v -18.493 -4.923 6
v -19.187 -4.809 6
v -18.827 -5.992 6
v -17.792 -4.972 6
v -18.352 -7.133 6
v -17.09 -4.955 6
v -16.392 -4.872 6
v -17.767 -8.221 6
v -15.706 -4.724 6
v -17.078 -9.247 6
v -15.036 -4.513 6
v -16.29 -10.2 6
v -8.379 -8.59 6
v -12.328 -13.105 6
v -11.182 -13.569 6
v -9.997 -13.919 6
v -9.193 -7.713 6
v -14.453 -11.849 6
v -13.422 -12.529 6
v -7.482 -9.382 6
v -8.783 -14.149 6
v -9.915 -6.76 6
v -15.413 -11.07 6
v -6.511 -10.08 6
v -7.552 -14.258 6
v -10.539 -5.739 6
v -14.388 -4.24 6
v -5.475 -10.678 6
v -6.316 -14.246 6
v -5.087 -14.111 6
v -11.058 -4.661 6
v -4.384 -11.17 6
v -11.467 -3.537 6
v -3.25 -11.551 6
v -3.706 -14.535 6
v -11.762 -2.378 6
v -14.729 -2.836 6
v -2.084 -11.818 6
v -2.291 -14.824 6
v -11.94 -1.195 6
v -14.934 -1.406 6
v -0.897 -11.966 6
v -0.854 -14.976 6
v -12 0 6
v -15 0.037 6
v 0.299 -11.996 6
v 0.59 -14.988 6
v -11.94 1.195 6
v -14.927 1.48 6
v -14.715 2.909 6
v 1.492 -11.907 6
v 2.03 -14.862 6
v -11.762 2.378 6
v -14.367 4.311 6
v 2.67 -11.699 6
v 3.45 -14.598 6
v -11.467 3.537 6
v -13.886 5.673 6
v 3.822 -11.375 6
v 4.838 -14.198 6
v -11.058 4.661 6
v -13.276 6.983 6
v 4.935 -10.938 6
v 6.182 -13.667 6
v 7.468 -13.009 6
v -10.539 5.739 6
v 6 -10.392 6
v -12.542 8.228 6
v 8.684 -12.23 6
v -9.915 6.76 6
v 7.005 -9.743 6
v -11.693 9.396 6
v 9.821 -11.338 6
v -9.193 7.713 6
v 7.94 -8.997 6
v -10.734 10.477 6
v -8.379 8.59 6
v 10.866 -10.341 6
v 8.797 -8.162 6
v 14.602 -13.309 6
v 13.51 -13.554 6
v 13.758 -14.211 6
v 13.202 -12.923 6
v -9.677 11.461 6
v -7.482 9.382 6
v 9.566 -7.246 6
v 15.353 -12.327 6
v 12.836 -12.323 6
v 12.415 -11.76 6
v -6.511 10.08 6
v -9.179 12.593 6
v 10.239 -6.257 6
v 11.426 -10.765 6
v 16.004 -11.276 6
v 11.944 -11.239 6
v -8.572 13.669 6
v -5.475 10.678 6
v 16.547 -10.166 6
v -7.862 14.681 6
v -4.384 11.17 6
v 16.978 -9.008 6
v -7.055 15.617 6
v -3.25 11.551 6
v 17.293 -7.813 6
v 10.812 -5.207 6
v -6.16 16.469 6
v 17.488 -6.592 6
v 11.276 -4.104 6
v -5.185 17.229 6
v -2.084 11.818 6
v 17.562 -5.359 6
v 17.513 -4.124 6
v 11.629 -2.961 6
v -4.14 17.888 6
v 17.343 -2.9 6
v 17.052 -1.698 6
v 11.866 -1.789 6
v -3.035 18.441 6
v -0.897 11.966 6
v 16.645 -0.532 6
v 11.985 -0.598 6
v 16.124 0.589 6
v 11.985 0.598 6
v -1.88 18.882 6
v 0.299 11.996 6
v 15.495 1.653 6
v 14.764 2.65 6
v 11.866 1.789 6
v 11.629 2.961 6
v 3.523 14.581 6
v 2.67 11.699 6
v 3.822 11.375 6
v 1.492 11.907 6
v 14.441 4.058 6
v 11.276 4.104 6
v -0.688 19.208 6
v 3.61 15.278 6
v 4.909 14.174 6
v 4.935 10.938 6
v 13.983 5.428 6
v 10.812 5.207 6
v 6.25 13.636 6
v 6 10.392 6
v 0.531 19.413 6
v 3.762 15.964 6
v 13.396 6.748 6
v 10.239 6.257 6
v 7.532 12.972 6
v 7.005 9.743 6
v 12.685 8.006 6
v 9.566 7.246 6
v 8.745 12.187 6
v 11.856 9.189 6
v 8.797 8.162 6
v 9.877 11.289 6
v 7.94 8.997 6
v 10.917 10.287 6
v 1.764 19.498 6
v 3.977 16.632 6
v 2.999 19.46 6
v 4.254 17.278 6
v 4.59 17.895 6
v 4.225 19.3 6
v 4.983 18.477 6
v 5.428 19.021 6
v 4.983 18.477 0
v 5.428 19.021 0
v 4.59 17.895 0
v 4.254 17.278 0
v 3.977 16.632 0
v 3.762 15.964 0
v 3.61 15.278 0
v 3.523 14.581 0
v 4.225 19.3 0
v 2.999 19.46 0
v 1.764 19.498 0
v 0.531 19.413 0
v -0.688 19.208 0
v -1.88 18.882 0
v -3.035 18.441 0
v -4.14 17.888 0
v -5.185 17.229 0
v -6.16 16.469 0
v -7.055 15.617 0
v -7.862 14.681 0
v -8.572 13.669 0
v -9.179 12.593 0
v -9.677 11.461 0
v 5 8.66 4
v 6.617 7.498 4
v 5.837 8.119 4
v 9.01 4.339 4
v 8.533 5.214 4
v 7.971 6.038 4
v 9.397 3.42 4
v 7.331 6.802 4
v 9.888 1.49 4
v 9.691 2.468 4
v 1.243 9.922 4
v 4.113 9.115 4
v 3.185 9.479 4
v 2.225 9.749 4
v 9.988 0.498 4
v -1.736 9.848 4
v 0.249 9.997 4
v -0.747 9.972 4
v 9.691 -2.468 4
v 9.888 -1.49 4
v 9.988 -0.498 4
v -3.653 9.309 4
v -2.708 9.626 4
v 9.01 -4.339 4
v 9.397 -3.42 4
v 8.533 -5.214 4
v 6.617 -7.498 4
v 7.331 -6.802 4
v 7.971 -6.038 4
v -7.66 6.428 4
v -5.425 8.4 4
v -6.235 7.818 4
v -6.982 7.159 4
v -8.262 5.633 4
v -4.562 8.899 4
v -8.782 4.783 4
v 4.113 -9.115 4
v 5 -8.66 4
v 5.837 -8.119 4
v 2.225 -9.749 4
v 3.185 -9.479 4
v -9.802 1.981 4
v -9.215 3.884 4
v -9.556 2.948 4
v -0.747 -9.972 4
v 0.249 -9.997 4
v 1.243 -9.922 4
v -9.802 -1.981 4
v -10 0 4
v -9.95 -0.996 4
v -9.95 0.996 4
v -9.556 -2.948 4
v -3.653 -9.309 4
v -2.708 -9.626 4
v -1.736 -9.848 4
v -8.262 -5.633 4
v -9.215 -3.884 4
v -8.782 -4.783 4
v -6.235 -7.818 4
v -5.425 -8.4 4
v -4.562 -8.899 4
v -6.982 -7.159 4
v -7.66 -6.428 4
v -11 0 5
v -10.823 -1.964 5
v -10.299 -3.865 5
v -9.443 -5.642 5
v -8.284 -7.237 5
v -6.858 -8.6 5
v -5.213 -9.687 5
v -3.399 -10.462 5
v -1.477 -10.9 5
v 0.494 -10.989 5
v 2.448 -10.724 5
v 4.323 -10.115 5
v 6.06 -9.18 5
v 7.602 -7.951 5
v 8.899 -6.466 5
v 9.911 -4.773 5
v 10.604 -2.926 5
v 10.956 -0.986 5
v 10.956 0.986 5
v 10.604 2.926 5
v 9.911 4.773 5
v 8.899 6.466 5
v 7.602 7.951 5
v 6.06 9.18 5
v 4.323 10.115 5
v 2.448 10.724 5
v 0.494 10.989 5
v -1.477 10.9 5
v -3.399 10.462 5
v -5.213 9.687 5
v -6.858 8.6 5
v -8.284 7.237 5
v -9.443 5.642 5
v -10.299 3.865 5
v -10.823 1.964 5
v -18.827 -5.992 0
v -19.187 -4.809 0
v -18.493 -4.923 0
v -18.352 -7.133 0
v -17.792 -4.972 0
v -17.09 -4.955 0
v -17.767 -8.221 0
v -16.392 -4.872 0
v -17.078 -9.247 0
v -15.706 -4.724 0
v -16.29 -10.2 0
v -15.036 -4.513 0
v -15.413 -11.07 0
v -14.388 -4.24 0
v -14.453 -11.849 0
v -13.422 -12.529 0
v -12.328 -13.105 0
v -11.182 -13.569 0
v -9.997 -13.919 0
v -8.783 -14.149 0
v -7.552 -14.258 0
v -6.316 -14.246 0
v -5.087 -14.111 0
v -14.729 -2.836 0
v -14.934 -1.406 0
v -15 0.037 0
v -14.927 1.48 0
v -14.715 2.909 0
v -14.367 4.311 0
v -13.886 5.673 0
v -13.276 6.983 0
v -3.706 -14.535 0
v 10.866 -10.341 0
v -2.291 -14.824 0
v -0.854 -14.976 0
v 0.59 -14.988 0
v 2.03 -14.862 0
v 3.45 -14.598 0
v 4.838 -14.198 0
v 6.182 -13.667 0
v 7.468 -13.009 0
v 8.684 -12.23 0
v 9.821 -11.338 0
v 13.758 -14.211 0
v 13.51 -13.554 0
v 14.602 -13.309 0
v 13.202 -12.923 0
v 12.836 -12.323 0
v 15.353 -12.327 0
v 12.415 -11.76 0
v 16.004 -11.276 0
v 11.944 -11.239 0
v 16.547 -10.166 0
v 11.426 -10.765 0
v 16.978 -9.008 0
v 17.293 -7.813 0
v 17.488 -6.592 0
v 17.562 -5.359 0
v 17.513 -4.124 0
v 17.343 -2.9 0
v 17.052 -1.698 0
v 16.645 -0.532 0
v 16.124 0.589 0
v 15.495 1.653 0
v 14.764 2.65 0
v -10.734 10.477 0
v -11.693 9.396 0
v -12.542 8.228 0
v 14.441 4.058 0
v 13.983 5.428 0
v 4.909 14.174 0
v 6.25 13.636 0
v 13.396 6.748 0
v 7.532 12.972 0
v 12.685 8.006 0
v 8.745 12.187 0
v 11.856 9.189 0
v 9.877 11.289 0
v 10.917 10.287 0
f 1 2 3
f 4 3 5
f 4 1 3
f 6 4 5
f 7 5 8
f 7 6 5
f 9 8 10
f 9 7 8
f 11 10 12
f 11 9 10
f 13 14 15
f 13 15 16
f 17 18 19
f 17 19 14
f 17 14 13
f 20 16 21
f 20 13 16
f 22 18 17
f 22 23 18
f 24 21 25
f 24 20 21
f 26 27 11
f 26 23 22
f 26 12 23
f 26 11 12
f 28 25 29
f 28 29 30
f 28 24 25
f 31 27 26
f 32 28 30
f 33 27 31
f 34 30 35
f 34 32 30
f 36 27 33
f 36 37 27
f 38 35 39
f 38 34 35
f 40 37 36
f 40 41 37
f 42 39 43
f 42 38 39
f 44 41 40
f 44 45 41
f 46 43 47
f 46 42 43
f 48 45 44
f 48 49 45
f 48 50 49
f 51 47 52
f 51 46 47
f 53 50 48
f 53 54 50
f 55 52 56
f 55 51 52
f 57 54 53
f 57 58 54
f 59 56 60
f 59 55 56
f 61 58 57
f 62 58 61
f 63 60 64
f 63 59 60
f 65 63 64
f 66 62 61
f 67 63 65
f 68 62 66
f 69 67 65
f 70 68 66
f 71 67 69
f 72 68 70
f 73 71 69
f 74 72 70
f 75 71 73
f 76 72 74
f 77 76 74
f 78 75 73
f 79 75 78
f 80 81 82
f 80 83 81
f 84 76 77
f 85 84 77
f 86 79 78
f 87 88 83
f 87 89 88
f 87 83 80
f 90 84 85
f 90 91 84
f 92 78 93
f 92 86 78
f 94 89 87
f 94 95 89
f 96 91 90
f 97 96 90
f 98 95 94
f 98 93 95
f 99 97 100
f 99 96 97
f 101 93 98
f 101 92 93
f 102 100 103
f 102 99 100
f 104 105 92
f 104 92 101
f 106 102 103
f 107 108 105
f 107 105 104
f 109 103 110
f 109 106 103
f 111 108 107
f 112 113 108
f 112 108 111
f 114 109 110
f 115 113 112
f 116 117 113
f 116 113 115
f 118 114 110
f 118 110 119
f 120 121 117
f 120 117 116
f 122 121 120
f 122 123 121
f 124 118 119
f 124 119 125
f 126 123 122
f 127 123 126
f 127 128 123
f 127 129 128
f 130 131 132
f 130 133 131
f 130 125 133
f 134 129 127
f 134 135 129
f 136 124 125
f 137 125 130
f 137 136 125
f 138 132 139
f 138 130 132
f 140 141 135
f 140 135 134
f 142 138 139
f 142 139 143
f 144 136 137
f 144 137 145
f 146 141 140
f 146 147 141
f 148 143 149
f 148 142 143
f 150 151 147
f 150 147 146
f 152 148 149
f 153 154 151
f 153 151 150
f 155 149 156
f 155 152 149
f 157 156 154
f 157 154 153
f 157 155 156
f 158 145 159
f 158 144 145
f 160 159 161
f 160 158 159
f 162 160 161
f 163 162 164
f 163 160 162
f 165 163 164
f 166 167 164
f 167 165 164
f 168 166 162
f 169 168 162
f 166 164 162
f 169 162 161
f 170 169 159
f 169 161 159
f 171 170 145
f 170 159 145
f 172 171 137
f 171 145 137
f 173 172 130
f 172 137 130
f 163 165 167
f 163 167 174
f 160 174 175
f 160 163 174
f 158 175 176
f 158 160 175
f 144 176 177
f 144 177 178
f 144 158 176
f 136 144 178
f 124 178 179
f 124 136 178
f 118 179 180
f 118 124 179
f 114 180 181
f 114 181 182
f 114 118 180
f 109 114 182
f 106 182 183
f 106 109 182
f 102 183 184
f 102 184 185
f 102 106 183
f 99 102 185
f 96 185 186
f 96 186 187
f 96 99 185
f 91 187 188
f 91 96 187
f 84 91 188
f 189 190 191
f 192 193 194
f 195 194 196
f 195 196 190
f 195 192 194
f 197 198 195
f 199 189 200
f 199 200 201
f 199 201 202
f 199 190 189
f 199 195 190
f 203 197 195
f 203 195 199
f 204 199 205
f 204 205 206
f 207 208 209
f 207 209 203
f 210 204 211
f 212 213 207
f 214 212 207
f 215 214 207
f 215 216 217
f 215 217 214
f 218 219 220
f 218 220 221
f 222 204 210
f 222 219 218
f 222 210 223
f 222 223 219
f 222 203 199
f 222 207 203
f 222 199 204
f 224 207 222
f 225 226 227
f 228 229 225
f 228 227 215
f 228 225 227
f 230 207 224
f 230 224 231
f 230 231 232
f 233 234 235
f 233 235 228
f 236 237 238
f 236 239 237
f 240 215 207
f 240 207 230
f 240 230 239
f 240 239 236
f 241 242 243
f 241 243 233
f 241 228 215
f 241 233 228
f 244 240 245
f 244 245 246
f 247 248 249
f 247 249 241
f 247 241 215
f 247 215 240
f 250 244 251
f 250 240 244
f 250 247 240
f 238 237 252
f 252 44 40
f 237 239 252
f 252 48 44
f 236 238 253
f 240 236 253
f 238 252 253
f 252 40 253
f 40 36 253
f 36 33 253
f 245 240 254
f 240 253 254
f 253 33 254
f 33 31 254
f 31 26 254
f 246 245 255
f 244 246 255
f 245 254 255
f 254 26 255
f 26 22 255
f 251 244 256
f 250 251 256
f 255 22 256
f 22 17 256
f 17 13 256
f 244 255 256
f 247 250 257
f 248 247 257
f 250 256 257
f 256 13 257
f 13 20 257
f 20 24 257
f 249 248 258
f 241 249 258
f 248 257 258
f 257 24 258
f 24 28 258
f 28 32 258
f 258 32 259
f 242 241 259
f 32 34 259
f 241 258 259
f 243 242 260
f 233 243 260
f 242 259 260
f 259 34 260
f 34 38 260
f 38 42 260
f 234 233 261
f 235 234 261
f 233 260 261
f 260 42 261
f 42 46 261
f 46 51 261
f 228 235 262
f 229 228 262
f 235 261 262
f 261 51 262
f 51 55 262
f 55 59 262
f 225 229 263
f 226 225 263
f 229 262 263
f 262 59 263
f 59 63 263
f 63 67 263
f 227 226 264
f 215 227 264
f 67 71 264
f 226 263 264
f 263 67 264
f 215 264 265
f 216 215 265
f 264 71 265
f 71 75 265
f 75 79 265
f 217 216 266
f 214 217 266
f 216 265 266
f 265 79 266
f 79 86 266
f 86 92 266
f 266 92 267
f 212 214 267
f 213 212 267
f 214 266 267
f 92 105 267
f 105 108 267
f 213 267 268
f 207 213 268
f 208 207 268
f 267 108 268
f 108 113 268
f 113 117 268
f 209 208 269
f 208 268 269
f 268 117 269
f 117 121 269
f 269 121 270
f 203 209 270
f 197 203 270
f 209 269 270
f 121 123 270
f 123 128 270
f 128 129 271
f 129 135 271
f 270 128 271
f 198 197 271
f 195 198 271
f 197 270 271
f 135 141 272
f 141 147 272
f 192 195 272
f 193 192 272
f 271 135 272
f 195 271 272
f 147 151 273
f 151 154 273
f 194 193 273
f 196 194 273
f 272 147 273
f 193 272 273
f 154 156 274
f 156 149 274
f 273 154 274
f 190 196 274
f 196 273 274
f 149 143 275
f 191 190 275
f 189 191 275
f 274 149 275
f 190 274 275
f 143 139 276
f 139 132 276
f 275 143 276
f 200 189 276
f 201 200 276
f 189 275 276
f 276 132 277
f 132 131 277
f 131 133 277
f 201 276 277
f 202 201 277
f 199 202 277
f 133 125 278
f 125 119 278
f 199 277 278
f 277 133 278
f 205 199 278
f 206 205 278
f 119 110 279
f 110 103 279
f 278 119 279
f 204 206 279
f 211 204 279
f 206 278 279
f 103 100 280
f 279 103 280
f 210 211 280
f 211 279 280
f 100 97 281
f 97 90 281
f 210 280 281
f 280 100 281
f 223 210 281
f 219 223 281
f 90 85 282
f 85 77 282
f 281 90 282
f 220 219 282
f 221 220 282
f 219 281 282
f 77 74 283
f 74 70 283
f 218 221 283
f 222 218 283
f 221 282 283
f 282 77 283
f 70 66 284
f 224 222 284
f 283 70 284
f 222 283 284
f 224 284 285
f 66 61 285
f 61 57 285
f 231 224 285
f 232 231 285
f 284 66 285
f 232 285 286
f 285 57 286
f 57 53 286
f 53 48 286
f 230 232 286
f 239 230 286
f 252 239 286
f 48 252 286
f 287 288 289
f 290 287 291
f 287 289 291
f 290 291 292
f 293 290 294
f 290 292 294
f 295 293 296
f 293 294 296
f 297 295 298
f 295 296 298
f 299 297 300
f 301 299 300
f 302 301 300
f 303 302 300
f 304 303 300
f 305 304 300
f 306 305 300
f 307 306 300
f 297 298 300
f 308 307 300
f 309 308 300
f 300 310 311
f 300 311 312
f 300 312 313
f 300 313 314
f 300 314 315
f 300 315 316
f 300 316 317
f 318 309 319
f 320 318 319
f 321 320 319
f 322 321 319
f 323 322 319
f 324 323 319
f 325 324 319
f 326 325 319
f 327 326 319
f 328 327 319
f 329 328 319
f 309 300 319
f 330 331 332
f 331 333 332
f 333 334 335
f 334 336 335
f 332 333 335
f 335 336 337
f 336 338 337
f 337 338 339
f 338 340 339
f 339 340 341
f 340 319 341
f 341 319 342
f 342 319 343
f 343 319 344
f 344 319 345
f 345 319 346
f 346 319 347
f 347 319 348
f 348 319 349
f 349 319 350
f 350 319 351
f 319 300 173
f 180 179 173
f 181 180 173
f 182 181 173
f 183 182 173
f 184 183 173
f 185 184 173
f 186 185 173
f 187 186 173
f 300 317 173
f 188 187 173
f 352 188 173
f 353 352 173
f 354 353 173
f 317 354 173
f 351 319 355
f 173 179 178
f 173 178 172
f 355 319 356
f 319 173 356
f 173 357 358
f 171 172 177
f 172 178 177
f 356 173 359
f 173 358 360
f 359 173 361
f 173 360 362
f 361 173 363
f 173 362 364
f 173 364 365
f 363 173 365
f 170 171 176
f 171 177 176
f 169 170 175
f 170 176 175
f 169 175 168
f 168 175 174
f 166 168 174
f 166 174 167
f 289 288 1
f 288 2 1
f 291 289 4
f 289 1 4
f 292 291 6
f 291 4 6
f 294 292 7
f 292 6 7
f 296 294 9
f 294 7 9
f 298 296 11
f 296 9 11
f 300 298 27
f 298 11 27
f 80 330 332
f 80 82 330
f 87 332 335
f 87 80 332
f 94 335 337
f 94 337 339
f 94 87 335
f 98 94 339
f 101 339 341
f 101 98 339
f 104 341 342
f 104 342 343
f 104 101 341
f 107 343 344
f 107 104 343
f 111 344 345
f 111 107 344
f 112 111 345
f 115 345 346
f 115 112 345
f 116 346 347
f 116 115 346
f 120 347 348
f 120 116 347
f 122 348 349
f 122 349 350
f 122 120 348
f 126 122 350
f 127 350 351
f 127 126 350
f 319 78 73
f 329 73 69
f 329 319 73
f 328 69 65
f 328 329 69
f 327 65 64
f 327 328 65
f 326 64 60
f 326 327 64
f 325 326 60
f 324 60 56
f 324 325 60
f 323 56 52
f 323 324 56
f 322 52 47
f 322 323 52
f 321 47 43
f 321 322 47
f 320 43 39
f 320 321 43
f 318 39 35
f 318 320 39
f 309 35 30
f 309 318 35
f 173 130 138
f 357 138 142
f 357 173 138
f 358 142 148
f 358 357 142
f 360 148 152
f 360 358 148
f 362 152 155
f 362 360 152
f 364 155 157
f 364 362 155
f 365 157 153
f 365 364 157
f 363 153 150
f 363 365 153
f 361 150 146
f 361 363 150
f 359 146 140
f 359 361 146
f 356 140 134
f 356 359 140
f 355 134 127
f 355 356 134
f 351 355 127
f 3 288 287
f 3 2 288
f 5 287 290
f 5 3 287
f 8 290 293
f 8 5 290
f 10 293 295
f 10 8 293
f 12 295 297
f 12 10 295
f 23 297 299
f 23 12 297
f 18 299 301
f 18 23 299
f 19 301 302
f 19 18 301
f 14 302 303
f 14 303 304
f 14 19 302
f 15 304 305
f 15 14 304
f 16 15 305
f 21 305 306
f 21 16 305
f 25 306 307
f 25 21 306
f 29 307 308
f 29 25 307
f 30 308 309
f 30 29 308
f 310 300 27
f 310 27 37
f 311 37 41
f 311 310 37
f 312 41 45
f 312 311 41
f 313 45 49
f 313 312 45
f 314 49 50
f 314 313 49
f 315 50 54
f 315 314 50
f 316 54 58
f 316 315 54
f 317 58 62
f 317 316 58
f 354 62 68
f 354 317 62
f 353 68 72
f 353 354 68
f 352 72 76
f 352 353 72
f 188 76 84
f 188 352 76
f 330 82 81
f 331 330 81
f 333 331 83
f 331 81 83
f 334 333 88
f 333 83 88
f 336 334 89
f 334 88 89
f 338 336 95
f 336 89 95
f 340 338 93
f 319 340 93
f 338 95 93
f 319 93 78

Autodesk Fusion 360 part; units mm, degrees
sketch "Sketch1" plane through (0, 0, 0) normal (0, 0, 1) x (1, 0, 0)
  circle A0 centre (0, 0) radius 15
  dimension "d1" = 30
extrude "Extrude1" add sketch "Sketch1" along normal blind 6
sketch "Sketch2" plane through (0, 0, 6) normal (0, 0, 1) x (-1, 0, 0)
  circle A0 centre (0, 0) radius 15
  circle A1 centre (-2, -7) radius 12.5
  circle A2 centre (-11, -14) radius 7.5
  dimension "d4" = 25
  dimension "d5" = 15
  dimension "d6" = 7
  dimension "d7" = 2
  dimension "d8" = 14
  dimension "d9" = 11
extrude "Extrude2" add sketch "Sketch2" against normal blind 6 contours A0 A1 A2 picked at (-2.4117, -16.9728)
pattern_circular "C-Pattern1" count 3 over 360 about axis through (0, 0, 6) along (0, 0, 1) of "Extrude2"
sketch "Sketch3" plane through (0, 0, 6) normal (0, 0, 1) x (-1, 0, 0)
  arc A0 (9.6768, -11.4612) -> (14.3884, 4.2397) centre (0, 0) ccw
  arc A1 (19.1866, 4.8092) -> (14.3884, 4.2397) centre (17.6244, -2.5263) ccw
  arc A2 (19.1866, 4.8092) -> (5.0873, 14.111) centre (7.0622, 1.7679) ccw
  arc A3 (5.0873, 14.111) -> (-10.8659, 10.3408) centre (0, 0) ccw
  arc A4 (-13.7582, 14.2114) -> (-10.8659, 10.3408) centre (-6.6244, 16.5263) ccw
  arc A5 (-13.7582, 14.2114) -> (-14.7641, -2.6497) centre (-5.0622, 5.2321) ccw
  arc A6 (-14.7641, -2.6497) -> (-3.5225, -14.5805) centre (0, 0) ccw
  arc A7 (-5.4284, -19.0207) -> (-3.5225, -14.5805) centre (-11, -14) ccw
  arc A8 (-5.4284, -19.0207) -> (9.6768, -11.4612) centre (-2, -7) ccw
  circle A9 centre (0, 0) radius 12
  dimension "d14" = 24
extrude "Extrude3" cut sketch "Sketch3" against normal blind 2 draft -45 contours A9
